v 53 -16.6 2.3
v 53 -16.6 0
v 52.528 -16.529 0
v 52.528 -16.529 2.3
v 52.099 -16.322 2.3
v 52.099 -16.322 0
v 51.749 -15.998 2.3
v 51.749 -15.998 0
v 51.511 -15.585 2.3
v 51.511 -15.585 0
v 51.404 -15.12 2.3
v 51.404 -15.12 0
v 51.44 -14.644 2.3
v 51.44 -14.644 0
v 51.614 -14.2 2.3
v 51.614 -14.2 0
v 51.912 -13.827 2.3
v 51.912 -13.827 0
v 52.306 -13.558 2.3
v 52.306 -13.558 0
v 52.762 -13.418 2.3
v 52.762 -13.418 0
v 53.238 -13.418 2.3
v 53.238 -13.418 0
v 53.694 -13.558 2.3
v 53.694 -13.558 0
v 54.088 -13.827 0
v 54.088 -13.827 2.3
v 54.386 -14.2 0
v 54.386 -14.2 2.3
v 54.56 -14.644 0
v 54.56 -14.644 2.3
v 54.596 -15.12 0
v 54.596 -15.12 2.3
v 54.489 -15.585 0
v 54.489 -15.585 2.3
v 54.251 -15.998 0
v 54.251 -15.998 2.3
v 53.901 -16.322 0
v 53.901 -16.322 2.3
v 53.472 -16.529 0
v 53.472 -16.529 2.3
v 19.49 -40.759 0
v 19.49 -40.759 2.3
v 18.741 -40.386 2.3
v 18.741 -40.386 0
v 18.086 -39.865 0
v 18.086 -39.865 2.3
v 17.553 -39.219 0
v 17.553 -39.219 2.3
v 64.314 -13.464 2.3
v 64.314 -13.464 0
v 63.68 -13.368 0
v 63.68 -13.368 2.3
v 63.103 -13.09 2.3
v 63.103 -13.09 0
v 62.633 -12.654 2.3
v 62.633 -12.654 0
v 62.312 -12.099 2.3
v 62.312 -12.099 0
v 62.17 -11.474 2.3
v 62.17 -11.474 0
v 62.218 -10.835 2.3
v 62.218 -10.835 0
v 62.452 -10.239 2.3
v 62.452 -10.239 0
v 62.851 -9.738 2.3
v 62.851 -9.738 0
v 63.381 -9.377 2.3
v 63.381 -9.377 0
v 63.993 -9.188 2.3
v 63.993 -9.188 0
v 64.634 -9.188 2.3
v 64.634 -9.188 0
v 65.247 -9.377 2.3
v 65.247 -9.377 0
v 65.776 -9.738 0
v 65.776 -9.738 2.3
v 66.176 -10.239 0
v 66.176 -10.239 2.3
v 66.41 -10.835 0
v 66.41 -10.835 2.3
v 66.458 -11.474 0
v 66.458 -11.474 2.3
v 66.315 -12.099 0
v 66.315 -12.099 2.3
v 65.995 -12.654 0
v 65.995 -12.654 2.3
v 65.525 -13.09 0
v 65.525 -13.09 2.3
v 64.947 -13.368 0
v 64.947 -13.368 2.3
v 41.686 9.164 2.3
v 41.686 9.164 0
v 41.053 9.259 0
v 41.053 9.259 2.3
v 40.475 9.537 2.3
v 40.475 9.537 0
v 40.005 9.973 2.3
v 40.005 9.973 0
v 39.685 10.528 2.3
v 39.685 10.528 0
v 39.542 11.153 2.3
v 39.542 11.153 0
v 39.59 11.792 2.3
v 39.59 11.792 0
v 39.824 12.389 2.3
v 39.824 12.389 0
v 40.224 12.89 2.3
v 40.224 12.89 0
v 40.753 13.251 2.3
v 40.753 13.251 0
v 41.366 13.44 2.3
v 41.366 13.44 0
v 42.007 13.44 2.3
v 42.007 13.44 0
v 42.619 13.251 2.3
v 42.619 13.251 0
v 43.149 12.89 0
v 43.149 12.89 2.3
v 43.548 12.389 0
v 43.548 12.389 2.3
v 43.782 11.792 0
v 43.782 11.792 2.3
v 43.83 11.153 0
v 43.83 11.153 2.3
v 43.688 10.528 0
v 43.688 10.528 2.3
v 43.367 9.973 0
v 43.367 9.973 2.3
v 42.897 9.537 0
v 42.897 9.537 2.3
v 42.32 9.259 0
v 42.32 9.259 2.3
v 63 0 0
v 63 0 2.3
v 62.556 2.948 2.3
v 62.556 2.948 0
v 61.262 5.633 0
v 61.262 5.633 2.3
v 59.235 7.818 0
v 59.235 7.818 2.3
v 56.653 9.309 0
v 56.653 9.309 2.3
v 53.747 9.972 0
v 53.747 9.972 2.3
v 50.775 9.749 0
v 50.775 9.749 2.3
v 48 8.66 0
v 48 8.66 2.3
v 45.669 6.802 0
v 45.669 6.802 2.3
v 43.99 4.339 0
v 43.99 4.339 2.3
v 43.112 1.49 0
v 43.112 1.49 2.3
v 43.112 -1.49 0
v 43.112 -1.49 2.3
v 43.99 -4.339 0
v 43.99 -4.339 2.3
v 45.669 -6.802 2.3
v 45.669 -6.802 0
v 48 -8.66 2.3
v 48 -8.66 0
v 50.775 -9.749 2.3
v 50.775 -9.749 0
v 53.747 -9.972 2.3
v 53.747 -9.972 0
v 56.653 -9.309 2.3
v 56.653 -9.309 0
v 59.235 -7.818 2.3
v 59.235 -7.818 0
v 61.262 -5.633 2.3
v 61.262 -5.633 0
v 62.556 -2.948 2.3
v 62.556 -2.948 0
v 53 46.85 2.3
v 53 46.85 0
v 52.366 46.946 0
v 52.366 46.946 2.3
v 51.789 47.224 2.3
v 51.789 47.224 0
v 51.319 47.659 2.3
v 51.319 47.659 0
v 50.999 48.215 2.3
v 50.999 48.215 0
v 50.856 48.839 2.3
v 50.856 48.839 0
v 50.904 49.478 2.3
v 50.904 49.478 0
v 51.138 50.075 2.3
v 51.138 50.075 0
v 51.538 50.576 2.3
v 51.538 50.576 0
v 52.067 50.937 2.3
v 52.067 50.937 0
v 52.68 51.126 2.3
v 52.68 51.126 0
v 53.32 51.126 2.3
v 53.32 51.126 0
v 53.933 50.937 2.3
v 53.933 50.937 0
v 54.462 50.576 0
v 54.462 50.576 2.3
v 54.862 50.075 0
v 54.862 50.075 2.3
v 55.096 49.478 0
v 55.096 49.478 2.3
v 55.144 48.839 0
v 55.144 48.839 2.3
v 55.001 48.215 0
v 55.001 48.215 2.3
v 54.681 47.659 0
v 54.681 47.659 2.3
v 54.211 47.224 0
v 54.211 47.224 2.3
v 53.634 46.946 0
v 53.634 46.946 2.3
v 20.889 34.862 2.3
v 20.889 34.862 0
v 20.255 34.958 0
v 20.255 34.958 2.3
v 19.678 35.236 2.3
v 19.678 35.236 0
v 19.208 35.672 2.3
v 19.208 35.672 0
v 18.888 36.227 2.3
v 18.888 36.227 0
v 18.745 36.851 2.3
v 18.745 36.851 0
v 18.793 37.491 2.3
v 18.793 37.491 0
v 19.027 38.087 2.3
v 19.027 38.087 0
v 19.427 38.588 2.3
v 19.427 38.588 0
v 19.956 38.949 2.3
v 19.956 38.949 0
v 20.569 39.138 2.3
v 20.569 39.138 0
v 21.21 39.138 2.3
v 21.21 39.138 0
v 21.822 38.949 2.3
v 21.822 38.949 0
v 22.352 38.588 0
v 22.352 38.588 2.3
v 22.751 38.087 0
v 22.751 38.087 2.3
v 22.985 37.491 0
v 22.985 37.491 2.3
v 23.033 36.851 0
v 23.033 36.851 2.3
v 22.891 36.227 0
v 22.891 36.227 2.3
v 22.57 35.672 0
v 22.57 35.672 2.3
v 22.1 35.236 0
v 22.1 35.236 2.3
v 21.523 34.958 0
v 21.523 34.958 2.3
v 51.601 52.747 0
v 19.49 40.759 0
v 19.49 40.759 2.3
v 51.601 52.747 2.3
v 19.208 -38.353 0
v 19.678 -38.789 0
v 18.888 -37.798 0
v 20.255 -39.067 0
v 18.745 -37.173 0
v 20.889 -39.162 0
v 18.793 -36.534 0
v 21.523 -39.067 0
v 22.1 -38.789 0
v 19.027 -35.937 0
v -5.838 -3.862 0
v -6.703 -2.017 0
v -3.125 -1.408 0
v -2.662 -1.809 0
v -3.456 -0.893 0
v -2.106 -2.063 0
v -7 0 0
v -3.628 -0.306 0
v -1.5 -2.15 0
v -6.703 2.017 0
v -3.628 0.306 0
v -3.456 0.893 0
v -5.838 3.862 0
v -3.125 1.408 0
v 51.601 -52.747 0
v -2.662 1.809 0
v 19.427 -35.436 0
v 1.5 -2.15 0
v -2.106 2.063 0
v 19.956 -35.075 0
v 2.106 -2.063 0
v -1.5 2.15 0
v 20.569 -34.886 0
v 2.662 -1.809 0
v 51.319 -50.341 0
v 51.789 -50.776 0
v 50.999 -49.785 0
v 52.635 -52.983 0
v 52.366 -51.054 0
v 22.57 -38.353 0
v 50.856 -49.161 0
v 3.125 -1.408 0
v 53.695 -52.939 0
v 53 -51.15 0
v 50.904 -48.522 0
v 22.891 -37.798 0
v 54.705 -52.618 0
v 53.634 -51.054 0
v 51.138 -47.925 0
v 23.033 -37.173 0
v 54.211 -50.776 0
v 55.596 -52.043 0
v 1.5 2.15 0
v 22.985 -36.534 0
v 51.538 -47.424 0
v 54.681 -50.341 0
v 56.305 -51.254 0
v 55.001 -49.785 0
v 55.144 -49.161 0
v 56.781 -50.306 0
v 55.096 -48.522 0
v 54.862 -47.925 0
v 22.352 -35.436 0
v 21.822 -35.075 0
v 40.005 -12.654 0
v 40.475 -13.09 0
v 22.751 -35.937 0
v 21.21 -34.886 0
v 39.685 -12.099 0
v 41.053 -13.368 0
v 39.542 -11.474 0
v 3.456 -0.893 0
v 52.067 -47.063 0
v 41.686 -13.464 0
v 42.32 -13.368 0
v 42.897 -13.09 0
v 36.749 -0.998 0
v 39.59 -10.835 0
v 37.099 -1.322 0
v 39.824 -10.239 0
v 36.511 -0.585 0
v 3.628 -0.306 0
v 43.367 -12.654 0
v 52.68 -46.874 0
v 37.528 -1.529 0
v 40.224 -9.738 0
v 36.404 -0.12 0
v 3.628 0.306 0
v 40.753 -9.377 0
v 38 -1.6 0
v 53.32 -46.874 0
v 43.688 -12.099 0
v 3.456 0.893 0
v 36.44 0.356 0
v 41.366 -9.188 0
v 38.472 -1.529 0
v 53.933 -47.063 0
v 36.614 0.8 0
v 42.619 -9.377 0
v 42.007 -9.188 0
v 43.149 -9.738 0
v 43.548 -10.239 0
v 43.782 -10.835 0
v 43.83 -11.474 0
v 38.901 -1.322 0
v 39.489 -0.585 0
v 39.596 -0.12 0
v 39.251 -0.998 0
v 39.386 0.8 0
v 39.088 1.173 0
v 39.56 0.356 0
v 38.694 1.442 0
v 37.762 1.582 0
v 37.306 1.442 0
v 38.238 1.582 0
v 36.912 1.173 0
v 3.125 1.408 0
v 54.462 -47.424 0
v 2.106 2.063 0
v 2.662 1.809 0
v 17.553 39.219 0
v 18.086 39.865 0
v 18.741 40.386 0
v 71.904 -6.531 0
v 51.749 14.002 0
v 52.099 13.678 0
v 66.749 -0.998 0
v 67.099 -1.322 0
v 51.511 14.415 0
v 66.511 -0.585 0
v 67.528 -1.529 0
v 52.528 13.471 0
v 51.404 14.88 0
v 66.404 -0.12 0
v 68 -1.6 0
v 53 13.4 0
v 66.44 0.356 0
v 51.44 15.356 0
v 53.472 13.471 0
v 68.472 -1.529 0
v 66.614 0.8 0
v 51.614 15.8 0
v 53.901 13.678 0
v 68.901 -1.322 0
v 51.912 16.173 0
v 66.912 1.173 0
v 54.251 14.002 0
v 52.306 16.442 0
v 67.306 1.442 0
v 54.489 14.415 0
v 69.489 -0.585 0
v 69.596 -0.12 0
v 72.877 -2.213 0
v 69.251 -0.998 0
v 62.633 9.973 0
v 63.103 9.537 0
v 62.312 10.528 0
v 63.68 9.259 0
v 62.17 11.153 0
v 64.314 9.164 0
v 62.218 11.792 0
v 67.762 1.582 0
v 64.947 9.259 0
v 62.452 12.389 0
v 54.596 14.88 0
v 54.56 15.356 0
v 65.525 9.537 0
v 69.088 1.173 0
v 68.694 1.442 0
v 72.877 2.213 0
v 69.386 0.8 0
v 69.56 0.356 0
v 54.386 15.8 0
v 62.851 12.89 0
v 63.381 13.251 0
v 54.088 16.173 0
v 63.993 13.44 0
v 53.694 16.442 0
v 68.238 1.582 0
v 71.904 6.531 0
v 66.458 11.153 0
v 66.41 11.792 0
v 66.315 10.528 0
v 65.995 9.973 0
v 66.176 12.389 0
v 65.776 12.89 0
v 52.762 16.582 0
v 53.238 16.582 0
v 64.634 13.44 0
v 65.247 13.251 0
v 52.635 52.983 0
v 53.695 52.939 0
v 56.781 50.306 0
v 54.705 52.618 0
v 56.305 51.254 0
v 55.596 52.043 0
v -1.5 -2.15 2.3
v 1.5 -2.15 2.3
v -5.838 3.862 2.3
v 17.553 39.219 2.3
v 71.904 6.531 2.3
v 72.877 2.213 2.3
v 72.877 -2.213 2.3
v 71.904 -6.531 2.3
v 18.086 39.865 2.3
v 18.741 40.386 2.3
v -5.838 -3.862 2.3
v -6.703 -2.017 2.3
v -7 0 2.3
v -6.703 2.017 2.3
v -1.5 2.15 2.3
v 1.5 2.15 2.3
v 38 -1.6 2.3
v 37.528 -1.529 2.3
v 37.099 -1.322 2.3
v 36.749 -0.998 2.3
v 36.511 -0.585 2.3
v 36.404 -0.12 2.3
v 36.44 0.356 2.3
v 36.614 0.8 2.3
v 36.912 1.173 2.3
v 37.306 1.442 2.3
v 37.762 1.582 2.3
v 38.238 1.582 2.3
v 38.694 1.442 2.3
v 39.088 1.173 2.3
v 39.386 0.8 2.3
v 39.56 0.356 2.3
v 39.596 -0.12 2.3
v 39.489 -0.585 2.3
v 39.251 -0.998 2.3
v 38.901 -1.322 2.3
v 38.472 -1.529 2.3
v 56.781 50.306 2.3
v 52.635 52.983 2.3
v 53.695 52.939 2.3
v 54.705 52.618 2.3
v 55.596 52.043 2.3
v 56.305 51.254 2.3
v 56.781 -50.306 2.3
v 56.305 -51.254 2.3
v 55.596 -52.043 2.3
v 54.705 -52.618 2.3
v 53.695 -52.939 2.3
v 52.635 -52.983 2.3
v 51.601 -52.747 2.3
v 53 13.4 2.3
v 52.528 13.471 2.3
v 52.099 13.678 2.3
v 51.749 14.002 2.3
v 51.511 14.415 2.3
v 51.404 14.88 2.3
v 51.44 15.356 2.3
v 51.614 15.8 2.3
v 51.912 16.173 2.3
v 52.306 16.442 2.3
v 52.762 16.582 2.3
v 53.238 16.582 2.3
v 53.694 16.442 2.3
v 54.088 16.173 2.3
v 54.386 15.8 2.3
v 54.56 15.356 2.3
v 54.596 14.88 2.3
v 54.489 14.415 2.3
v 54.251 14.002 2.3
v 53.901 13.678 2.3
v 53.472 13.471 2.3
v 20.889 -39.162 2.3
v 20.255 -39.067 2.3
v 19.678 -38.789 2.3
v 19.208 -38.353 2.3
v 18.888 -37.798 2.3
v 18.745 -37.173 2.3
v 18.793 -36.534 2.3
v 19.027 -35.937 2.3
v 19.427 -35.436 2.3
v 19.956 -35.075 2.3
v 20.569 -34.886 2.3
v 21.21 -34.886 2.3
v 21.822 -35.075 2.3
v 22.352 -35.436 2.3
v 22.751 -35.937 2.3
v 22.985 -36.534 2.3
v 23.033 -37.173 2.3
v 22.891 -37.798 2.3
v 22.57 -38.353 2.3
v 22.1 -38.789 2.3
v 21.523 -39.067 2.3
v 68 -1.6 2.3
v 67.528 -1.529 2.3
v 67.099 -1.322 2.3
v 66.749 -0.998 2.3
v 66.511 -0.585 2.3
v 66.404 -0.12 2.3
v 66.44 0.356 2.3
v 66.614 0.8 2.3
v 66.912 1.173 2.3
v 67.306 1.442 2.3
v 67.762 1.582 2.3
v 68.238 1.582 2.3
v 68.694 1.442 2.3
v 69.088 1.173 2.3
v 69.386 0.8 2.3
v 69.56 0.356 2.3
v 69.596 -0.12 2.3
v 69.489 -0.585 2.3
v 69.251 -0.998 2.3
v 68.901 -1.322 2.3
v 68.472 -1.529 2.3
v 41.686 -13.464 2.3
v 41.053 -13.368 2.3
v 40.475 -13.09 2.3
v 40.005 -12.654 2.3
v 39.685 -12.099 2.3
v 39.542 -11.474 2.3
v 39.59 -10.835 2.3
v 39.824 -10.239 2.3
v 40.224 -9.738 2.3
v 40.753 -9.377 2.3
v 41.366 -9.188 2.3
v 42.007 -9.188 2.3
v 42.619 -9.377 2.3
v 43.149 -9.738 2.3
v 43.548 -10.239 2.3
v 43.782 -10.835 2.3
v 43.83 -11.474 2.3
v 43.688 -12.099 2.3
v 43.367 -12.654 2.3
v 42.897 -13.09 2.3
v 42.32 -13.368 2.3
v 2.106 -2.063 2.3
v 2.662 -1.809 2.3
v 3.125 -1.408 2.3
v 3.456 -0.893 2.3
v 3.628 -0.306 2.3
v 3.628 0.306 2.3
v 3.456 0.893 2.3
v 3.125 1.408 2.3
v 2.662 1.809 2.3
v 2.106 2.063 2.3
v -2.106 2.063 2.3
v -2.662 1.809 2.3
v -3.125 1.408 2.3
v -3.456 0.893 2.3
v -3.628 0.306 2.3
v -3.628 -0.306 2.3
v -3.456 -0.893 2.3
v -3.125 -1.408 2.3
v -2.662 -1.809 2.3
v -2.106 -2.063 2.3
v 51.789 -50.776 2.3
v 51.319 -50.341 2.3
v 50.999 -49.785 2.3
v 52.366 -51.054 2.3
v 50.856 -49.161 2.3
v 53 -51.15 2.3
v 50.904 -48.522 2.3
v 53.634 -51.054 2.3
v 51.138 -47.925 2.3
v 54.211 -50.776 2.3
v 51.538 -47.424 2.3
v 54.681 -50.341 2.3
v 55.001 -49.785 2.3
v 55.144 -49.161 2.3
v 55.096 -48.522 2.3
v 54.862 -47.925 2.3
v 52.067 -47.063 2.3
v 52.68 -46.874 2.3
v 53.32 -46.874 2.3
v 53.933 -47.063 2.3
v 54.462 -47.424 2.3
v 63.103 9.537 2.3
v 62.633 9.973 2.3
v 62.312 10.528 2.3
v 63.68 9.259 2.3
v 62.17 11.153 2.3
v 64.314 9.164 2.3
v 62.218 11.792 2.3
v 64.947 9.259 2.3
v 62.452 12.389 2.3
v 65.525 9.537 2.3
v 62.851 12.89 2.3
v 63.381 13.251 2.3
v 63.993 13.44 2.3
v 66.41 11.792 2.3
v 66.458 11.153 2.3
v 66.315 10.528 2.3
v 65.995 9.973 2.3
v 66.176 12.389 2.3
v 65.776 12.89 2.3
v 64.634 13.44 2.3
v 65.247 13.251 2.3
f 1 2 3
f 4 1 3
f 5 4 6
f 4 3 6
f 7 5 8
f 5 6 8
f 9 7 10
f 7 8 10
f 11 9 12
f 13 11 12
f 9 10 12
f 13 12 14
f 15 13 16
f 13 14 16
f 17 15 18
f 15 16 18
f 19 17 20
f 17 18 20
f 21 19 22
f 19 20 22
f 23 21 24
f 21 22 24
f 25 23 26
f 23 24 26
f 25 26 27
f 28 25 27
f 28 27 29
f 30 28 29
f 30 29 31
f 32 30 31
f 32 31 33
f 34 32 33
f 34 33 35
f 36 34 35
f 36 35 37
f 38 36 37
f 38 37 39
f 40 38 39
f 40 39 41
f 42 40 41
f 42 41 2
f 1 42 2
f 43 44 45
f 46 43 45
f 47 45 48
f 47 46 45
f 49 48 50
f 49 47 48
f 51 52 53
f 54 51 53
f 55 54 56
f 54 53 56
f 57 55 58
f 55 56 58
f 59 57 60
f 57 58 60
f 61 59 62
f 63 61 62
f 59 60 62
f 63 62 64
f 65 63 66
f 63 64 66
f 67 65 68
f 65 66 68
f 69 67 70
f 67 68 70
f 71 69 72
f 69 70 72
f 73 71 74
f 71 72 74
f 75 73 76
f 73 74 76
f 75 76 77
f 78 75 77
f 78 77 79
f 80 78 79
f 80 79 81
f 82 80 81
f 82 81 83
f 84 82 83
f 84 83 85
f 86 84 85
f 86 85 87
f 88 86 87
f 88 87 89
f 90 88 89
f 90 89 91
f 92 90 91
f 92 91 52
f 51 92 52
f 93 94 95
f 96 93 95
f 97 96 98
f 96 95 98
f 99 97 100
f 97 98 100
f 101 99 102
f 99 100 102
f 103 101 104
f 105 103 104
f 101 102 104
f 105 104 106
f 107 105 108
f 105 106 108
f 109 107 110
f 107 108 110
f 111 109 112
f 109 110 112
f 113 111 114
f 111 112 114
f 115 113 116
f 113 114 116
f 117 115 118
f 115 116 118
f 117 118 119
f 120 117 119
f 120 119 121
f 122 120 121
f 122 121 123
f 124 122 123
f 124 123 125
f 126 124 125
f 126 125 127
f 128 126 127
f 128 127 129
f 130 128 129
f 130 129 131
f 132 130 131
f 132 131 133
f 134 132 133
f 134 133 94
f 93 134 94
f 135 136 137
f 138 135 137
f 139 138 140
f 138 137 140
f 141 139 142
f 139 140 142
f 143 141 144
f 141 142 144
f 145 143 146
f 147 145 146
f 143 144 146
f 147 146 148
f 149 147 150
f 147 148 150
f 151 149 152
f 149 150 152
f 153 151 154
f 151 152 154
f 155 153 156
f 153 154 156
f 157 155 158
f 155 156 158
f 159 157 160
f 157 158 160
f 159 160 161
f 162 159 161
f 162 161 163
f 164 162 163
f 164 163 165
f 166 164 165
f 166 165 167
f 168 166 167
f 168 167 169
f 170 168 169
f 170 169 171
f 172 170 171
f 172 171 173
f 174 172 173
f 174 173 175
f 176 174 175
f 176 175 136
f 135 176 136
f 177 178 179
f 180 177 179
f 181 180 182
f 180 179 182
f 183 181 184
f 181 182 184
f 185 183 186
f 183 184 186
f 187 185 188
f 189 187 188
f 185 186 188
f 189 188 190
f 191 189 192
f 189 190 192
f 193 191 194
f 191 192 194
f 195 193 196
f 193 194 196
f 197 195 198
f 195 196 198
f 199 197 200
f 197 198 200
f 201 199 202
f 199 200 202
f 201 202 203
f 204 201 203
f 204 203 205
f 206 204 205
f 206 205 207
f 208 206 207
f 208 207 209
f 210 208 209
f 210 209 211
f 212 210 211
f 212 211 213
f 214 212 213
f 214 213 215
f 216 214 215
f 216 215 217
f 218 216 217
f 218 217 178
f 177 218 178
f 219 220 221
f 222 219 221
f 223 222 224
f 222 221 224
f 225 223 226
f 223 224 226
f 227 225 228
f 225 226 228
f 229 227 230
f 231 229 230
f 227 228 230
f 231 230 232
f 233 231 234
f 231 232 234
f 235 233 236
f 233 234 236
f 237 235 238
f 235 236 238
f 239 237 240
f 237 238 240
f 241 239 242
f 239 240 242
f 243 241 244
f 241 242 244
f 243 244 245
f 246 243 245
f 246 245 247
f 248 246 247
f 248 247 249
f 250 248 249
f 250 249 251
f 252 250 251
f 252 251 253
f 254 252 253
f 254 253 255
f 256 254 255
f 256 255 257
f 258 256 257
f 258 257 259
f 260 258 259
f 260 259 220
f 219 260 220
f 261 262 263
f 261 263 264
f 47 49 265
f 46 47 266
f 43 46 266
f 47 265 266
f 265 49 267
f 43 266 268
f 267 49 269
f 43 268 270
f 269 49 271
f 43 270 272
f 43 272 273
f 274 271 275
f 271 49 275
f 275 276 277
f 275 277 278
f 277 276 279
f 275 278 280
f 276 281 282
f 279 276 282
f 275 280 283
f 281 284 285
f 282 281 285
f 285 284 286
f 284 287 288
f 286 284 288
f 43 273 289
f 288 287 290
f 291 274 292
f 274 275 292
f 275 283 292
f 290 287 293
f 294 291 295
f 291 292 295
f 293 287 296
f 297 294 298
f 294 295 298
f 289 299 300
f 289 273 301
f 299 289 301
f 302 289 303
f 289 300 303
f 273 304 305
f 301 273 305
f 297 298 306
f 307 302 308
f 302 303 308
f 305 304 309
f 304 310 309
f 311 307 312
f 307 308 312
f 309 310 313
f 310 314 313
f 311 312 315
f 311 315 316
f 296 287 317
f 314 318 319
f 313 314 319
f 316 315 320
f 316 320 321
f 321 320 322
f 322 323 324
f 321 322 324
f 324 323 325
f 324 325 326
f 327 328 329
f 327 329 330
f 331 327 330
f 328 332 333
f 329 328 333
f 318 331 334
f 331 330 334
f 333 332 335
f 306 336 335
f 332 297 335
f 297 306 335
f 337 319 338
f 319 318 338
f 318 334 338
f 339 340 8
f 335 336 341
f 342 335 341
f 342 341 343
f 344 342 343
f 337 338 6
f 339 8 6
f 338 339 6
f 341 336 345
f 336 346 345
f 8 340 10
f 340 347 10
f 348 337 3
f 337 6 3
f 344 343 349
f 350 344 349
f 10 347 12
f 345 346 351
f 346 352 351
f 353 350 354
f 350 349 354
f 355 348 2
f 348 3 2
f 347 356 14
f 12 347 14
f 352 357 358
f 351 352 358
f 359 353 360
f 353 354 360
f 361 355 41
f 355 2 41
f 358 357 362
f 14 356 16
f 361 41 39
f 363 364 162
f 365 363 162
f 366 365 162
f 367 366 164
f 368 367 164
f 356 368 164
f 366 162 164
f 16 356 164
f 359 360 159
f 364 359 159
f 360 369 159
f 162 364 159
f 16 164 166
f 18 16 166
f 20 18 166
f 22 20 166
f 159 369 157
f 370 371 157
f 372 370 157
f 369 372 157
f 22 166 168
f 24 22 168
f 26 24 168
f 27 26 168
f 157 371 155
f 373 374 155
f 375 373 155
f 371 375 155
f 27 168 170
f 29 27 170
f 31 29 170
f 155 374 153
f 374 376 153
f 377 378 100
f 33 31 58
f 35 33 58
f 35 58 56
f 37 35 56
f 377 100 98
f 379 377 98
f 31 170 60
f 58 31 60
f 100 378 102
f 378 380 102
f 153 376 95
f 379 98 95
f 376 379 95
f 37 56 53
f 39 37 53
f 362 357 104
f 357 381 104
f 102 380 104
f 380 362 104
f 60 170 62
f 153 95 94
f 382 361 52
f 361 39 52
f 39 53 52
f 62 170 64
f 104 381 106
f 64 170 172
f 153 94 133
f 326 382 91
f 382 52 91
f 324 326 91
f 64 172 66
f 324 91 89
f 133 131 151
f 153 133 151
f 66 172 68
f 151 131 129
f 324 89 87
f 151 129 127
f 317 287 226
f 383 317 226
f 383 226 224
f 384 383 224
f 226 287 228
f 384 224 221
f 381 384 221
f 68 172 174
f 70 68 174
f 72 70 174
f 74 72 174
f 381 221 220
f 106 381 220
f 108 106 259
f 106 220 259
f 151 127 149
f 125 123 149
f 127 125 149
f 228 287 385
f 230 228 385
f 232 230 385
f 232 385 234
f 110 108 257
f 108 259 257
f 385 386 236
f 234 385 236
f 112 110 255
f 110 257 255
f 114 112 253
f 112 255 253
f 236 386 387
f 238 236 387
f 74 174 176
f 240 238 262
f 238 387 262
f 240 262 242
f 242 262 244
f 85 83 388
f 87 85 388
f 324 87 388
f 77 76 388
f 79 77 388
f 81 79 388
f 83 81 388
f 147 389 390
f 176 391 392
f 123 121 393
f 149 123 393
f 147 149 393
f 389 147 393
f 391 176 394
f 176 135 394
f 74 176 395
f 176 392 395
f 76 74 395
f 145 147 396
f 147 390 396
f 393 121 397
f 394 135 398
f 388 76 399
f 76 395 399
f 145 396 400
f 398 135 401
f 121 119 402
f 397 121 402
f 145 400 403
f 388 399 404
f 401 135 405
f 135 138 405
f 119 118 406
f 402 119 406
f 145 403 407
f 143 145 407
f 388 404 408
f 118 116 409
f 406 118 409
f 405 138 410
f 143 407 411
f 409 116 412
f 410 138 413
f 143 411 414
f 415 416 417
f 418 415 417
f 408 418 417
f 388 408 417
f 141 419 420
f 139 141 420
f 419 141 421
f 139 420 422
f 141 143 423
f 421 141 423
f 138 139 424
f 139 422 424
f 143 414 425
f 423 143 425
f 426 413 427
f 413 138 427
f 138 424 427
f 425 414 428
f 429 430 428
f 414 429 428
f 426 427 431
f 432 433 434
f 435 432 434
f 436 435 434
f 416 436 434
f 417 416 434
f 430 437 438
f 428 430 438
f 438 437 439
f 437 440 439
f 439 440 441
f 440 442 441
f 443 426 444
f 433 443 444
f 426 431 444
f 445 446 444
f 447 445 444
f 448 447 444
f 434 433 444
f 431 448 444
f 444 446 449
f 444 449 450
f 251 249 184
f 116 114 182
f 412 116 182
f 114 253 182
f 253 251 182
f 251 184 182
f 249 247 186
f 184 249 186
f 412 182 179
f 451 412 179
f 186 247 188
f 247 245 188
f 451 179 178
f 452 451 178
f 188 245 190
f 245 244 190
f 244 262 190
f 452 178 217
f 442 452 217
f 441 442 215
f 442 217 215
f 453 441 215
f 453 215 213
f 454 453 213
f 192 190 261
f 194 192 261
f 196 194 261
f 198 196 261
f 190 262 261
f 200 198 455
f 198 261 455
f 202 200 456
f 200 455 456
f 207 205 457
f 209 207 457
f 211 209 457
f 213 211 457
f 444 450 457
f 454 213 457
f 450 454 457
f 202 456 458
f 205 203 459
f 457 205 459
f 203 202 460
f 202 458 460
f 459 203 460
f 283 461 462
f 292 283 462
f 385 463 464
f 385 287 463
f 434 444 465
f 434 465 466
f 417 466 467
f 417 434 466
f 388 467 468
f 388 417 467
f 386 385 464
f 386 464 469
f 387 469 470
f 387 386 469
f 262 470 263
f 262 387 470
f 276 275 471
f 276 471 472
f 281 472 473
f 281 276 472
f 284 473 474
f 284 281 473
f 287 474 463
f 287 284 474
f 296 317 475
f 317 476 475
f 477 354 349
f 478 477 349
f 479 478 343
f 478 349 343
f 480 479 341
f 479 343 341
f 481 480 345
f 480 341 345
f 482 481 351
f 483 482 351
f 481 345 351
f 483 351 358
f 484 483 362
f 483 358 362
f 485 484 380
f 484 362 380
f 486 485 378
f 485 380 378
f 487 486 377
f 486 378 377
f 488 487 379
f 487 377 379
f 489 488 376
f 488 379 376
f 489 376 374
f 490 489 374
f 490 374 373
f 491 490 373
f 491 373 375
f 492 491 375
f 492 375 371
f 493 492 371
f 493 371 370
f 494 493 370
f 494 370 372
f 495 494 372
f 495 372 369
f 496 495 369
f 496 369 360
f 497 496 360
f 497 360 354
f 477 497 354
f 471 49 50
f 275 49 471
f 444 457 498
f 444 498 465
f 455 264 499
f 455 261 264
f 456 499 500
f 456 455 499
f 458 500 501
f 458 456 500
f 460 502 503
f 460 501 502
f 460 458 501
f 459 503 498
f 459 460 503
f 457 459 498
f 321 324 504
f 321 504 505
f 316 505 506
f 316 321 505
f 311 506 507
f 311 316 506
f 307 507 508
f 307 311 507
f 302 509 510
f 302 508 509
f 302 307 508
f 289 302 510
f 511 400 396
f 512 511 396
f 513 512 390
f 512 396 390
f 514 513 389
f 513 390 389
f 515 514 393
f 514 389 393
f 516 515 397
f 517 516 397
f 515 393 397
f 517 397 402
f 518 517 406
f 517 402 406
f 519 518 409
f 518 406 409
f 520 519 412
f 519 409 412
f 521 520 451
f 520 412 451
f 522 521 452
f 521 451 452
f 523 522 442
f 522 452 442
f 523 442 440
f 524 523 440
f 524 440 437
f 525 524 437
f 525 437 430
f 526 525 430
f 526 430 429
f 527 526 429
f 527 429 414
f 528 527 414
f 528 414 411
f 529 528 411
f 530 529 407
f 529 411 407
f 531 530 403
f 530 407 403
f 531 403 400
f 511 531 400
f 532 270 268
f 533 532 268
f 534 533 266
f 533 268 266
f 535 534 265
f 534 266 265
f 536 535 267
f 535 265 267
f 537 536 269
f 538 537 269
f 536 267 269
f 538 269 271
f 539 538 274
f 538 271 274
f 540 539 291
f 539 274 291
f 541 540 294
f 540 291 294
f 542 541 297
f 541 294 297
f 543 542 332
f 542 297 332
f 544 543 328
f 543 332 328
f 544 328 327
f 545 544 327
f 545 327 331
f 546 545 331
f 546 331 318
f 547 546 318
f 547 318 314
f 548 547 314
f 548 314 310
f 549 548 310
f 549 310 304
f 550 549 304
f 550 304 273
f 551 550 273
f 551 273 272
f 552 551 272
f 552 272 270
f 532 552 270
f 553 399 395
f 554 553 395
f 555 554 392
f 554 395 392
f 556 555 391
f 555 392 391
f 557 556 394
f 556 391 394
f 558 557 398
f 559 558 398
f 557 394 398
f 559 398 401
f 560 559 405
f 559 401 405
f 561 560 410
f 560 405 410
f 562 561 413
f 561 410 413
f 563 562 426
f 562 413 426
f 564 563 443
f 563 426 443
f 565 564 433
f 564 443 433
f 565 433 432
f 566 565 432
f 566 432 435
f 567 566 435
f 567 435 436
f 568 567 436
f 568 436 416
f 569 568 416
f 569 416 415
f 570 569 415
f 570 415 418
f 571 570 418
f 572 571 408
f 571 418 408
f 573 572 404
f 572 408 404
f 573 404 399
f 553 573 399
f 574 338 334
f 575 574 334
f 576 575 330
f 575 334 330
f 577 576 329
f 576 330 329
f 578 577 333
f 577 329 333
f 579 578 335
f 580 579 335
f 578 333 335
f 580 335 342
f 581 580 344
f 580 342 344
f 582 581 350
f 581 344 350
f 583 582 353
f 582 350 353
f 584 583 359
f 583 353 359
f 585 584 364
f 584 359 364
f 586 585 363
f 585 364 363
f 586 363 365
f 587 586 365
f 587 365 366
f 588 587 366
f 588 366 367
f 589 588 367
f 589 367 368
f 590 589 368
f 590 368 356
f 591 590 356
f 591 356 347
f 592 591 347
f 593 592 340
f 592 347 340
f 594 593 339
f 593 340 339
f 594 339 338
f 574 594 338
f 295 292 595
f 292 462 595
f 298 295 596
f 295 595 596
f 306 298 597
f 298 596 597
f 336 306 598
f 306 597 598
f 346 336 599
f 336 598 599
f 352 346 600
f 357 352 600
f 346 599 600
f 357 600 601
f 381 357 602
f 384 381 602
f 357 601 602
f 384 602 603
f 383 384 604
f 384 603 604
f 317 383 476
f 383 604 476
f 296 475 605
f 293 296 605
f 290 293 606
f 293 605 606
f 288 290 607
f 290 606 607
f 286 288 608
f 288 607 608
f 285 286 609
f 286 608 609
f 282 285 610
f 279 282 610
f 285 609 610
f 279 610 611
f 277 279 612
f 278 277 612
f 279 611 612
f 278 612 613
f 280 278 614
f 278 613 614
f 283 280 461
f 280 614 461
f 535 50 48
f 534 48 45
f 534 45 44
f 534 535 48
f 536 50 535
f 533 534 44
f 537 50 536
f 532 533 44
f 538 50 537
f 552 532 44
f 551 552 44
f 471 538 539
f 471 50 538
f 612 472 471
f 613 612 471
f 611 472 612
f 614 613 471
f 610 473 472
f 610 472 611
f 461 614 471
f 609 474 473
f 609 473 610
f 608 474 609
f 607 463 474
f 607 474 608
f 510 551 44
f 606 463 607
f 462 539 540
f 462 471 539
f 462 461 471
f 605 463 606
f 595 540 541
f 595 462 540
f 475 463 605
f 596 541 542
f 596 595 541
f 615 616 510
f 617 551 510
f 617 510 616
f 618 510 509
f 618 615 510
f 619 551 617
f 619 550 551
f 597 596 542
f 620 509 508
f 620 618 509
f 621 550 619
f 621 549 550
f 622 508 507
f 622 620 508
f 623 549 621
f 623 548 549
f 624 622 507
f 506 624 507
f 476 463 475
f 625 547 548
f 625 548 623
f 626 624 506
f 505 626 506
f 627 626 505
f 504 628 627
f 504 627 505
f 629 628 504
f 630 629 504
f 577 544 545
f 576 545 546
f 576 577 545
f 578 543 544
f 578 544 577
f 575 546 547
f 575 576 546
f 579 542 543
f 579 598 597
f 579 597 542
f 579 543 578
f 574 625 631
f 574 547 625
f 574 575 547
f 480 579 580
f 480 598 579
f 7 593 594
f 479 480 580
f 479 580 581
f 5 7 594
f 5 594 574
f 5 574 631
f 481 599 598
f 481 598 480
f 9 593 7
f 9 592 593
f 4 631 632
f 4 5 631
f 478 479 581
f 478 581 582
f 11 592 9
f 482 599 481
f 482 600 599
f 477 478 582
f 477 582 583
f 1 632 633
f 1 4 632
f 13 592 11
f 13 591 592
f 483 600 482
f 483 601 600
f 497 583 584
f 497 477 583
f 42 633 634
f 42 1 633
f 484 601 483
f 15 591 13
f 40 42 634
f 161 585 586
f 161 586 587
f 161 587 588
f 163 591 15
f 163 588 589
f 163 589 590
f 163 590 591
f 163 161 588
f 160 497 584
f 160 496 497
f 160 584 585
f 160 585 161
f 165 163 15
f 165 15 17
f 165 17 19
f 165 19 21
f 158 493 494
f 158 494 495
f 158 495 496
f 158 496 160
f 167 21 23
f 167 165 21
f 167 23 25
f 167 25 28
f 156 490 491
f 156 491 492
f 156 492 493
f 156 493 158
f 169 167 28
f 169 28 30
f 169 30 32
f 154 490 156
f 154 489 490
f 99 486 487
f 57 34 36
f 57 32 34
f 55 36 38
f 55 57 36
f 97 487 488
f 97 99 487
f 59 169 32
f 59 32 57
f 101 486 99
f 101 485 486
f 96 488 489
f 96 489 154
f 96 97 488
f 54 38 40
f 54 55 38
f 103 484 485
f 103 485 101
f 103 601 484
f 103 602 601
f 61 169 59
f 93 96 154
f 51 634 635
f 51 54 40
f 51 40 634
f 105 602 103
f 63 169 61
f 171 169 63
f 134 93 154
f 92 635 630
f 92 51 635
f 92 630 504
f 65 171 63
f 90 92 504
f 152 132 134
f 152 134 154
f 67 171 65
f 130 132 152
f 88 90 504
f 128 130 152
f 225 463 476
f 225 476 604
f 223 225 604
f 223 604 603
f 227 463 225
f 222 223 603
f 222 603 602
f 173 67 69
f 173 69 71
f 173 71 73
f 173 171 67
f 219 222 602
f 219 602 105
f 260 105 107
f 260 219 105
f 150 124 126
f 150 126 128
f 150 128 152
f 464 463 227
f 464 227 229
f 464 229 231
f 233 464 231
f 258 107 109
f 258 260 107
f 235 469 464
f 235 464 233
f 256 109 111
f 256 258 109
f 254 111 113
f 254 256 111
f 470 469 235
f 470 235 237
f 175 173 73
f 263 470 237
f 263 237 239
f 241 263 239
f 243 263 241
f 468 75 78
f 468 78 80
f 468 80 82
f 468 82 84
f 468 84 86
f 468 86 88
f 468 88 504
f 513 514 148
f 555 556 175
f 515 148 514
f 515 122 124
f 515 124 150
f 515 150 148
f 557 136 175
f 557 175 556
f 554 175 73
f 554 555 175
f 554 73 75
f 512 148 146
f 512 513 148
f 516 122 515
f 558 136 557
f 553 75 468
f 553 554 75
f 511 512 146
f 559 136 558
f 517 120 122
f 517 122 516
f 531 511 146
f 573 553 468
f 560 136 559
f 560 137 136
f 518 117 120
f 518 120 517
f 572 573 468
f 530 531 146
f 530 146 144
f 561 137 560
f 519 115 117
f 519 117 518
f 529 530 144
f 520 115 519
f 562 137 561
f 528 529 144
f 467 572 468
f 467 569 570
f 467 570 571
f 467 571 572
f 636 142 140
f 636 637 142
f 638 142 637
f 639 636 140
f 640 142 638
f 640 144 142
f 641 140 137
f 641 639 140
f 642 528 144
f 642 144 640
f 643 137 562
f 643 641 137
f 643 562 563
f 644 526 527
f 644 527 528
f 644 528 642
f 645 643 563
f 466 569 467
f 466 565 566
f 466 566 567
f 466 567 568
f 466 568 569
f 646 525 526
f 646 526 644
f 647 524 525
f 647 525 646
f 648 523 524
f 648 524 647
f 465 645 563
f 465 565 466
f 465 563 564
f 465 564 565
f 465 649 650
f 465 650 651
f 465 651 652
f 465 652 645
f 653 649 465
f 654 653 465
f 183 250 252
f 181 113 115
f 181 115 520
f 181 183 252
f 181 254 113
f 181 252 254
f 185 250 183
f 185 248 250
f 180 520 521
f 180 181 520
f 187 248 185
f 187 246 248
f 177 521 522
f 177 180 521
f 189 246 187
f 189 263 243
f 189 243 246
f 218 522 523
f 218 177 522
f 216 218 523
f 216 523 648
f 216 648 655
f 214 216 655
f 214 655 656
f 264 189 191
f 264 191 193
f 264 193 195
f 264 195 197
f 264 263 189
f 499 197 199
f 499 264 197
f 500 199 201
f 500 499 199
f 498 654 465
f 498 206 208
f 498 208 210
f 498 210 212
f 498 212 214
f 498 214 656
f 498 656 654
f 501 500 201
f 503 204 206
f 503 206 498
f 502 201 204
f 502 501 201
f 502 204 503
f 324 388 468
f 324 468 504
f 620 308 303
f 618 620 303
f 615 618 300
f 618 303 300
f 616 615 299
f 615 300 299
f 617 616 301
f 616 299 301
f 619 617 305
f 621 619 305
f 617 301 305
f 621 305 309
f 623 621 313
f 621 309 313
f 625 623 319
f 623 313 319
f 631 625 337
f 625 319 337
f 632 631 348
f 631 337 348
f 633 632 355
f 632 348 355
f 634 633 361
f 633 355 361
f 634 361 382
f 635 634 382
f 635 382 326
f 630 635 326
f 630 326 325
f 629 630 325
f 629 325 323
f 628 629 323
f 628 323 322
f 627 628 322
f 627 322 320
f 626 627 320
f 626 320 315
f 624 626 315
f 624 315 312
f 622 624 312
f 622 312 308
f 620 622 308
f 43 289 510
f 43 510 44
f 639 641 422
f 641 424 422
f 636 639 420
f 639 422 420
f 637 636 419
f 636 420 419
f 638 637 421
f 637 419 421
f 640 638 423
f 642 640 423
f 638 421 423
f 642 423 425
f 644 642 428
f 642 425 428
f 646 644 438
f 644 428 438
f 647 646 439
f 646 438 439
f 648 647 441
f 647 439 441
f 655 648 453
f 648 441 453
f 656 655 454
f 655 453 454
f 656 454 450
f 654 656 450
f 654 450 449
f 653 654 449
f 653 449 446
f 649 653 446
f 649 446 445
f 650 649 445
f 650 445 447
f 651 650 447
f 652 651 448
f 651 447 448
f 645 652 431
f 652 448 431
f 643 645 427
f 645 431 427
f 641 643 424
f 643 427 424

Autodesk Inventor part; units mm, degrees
ref_plane "YZ Plane" through (0, 0, 0) normal (1, 0, 0) x (0, 1, 0)
ref_plane "XZ Plane" through (0, 0, 0) normal (0, 1, 0) x (-1, 0, 0)
ref_plane "XY Plane" through (0, 0, 0) normal (0, 0, 1) x (1, 0, 0)
sketch "スケッチ1" plane through (0, 0, 0) normal (0, 0, 1) x (1, 0, 0)
  circle A0 centre (0, 0) radius 42.5 construction
  arc A1 (71.9037, -6.5306) -> (71.9037, 6.5306) centre (53, 0) ccw
  circle A2 centre (53, 0) radius 49 construction
  arc A3 (-5.838, 3.8623) -> (-5.838, -3.8623) centre (0, 0) ccw
  arc A4 (19.4901, 40.7594) -> (17.317, 38.812) centre (20.8892, 37.0121) ccw
  arc A5 (17.317, -38.812) -> (19.4901, -40.7594) centre (20.8892, -37.0121) ccw
  arc A6 (56.7807, 50.3061) -> (51.601, 52.7474) centre (53, 49) ccw
  arc A7 (51.601, -52.7474) -> (56.7807, -50.3061) centre (53, -49) ccw
  line L0 (19.4901, 40.7594) -> (51.601, 52.7474)
  line L1 (56.7807, 50.3061) -> (71.9037, 6.5306)
  line L2 (71.9037, -6.5306) -> (56.7807, -50.3061)
  line L3 (51.601, -52.7474) -> (19.4901, -40.7594)
  line L4 (17.5531, -39.2191) -> (-5.838, -3.8623)
  line L5 (-5.838, 3.8623) -> (17.5531, 39.2191)
  dimension "d0" = 53
  dimension "d1" = 40
  dimension "d2" = 98
  dimension "d3" = 85
  dimension "d4" = 14
  dimension "d5" = 8
  dimension "d6" = 8
  dimension "d7" = 8
  dimension "d8" = 8
extrude "プレート1" add sketch "スケッチ1" along normal blind 2.3
sketch "スケッチ2" plane through (0, 0, 2.3) normal (0, 0, 1) x (1, 0, 0)
  arc A0 (71.9037, -6.5306) -> (71.9037, 6.5306) centre (53, 0) ccw projected
  line L0 (56.7807, 50.3061) -> (71.9037, 6.5306) projected
  arc A1 (56.7807, 50.3061) -> (51.601, 52.7474) centre (53, 49) ccw projected
  line L1 (19.4901, 40.7594) -> (51.601, 52.7474) projected
  arc A2 (19.4901, 40.7594) -> (17.5531, 39.2191) centre (20.8892, 37.0121) ccw projected
  line L2 (-5.838, 3.8623) -> (17.5531, 39.2191) projected
  arc A3 (-5.838, 3.8623) -> (-5.838, -3.8623) centre (0, 0) ccw projected
  line L3 (17.5531, -39.2191) -> (-5.838, -3.8623) projected
  arc A4 (17.5531, -39.2191) -> (19.4901, -40.7594) centre (20.8892, -37.0121) ccw projected
  line L4 (51.601, -52.7474) -> (19.4901, -40.7594) projected
  arc A5 (51.601, -52.7474) -> (56.7807, -50.3061) centre (53, -49) ccw projected
  line L5 (71.9037, -6.5306) -> (56.7807, -50.3061) projected
hole "穴1" at (53, 49, 2.3) at (53, -49, 2.3) at (20.8892, 37.0121, 2.3) at (20.8892, -37.0121, 2.3) direction (0, 0, -1) diameter 4.3 depth 2.3 clearance for "Flat Head Machine Screw" size "M4" standard "Ansi Metric M Profile"
sketch "スケッチ3" plane through (0, 0, 2.3) normal (0, 0, 1) x (1, 0, 0)
  arc A0 (71.9037, -6.5306) -> (71.9037, 6.5306) centre (53, 0) ccw projected
  circle A1 centre (53, 0) radius 10
  point P0 (0, 0)
  dimension "d17" = 20
extrude "押し出し1" cut sketch "スケッチ3" against normal blind 10
sketch "スケッチ4" plane through (0, 0, 2.3) normal (0, 0, 1) x (1, 0, 0)
  arc A0 (71.9037, -6.5306) -> (71.9037, 6.5306) centre (53, 0) ccw projected
  circle A1 centre (53, 0) radius 15
  point P0 (0, 0)
  point P1 (38, 0)
  point P2 (53, -15)
  point P3 (68, 0)
  point P4 (53, 15)
  dimension "d20" = 30
  dimension "d23" = 360
hole "穴2" at (38, 0, 2.3) at (53, -15, 2.3) at (68, 0, 2.3) at (53, 15, 2.3) direction (0, 0, -1) diameter 3.2 depth 2.3 clearance for "Flat Head Machine Screw" size "M3" standard "Ansi Metric M Profile"
sketch "スケッチ5" plane through (0, 0, 2.3) normal (0, 0, 1) x (1, 0, 0)
  arc A0 (71.9037, -6.5306) -> (71.9037, 6.5306) centre (53, 0) ccw projected
  circle A1 centre (53, 0) radius 16
  point P0 (0, 0)
  point P1 (41.6863, 11.3137)
  point P2 (41.6863, -11.3137)
  point P3 (64.3137, -11.3137)
  point P4 (64.3137, 11.3137)
  dimension "d32" = 32
  dimension "d35" = 360
hole "穴3" at (41.6863, 11.3137, 2.3) at (41.6863, -11.3137, 2.3) at (64.3137, -11.3137, 2.3) at (64.3137, 11.3137, 2.3) direction (0, 0, -1) diameter 4.3 depth 2.3 clearance for "Flat Head Machine Screw" size "M4" standard "Ansi Metric M Profile"
sketch "スケッチ6" plane through (0, 0, 2.3) normal (0, 0, 1) x (1, 0, 0)
  arc A0 (-5.838, 3.8623) -> (-5.838, -3.8623) centre (0, 0) ccw projected
hole "穴4" at (0, 0, 2.3) direction (0, 0, -1) diameter 4.3 depth 2.3 clearance for "Flat Head Machine Screw" size "M4" standard "Ansi Metric M Profile"
sketch "スケッチ7" plane through (0, 0, 2.3) normal (0, 0, 1) x (1, 0, 0)
  line L0 (-1.5, 0) -> (1.5, 0) construction
  line L1 (-1.5, -2.15) -> (1.5, -2.15)
  line L2 (1.5, 2.15) -> (-1.5, 2.15)
  arc A0 (-1.5, 2.15) -> (-1.5, -2.15) centre (-1.5, 0) ccw
  arc A1 (1.5, -2.15) -> (1.5, 2.15) centre (1.5, 0) ccw
  circle A2 centre (0, 0) radius 2.15 projected
  point P0 (0, 2.15)
  point P1 (0, -2.15)
  dimension "d51" = 3
extrude "押し出し2" cut sketch "スケッチ7" against normal blind 10
equation "\"d15\" = Thickness"
equation "\"d30\" = Thickness"
equation "\"d42\" = Thickness"
equation "\"d49\" = Thickness"
equation "\"d9\" = Thickness"
equation "\"BendRadius\" = Thickness"
equation "\"BendReliefWidth\" = Thickness"
equation "\"BendReliefDepth\" = 0.5 * Thickness"
equation "\"CornerReliefSize\" = 4 * Thickness"
equation "\"MinimumRemnant\" = 2 * Thickness"
equation "\"TransitionRadius\" = BendRadius"
equation "\"JacobiRadiusSize\" = BendRadius"
equation "\"GapSize\" = Thickness"
equation "\"Thickness\" = 2.3"
properties part number "steel_plate7" material "鋼、炭素鋼"
